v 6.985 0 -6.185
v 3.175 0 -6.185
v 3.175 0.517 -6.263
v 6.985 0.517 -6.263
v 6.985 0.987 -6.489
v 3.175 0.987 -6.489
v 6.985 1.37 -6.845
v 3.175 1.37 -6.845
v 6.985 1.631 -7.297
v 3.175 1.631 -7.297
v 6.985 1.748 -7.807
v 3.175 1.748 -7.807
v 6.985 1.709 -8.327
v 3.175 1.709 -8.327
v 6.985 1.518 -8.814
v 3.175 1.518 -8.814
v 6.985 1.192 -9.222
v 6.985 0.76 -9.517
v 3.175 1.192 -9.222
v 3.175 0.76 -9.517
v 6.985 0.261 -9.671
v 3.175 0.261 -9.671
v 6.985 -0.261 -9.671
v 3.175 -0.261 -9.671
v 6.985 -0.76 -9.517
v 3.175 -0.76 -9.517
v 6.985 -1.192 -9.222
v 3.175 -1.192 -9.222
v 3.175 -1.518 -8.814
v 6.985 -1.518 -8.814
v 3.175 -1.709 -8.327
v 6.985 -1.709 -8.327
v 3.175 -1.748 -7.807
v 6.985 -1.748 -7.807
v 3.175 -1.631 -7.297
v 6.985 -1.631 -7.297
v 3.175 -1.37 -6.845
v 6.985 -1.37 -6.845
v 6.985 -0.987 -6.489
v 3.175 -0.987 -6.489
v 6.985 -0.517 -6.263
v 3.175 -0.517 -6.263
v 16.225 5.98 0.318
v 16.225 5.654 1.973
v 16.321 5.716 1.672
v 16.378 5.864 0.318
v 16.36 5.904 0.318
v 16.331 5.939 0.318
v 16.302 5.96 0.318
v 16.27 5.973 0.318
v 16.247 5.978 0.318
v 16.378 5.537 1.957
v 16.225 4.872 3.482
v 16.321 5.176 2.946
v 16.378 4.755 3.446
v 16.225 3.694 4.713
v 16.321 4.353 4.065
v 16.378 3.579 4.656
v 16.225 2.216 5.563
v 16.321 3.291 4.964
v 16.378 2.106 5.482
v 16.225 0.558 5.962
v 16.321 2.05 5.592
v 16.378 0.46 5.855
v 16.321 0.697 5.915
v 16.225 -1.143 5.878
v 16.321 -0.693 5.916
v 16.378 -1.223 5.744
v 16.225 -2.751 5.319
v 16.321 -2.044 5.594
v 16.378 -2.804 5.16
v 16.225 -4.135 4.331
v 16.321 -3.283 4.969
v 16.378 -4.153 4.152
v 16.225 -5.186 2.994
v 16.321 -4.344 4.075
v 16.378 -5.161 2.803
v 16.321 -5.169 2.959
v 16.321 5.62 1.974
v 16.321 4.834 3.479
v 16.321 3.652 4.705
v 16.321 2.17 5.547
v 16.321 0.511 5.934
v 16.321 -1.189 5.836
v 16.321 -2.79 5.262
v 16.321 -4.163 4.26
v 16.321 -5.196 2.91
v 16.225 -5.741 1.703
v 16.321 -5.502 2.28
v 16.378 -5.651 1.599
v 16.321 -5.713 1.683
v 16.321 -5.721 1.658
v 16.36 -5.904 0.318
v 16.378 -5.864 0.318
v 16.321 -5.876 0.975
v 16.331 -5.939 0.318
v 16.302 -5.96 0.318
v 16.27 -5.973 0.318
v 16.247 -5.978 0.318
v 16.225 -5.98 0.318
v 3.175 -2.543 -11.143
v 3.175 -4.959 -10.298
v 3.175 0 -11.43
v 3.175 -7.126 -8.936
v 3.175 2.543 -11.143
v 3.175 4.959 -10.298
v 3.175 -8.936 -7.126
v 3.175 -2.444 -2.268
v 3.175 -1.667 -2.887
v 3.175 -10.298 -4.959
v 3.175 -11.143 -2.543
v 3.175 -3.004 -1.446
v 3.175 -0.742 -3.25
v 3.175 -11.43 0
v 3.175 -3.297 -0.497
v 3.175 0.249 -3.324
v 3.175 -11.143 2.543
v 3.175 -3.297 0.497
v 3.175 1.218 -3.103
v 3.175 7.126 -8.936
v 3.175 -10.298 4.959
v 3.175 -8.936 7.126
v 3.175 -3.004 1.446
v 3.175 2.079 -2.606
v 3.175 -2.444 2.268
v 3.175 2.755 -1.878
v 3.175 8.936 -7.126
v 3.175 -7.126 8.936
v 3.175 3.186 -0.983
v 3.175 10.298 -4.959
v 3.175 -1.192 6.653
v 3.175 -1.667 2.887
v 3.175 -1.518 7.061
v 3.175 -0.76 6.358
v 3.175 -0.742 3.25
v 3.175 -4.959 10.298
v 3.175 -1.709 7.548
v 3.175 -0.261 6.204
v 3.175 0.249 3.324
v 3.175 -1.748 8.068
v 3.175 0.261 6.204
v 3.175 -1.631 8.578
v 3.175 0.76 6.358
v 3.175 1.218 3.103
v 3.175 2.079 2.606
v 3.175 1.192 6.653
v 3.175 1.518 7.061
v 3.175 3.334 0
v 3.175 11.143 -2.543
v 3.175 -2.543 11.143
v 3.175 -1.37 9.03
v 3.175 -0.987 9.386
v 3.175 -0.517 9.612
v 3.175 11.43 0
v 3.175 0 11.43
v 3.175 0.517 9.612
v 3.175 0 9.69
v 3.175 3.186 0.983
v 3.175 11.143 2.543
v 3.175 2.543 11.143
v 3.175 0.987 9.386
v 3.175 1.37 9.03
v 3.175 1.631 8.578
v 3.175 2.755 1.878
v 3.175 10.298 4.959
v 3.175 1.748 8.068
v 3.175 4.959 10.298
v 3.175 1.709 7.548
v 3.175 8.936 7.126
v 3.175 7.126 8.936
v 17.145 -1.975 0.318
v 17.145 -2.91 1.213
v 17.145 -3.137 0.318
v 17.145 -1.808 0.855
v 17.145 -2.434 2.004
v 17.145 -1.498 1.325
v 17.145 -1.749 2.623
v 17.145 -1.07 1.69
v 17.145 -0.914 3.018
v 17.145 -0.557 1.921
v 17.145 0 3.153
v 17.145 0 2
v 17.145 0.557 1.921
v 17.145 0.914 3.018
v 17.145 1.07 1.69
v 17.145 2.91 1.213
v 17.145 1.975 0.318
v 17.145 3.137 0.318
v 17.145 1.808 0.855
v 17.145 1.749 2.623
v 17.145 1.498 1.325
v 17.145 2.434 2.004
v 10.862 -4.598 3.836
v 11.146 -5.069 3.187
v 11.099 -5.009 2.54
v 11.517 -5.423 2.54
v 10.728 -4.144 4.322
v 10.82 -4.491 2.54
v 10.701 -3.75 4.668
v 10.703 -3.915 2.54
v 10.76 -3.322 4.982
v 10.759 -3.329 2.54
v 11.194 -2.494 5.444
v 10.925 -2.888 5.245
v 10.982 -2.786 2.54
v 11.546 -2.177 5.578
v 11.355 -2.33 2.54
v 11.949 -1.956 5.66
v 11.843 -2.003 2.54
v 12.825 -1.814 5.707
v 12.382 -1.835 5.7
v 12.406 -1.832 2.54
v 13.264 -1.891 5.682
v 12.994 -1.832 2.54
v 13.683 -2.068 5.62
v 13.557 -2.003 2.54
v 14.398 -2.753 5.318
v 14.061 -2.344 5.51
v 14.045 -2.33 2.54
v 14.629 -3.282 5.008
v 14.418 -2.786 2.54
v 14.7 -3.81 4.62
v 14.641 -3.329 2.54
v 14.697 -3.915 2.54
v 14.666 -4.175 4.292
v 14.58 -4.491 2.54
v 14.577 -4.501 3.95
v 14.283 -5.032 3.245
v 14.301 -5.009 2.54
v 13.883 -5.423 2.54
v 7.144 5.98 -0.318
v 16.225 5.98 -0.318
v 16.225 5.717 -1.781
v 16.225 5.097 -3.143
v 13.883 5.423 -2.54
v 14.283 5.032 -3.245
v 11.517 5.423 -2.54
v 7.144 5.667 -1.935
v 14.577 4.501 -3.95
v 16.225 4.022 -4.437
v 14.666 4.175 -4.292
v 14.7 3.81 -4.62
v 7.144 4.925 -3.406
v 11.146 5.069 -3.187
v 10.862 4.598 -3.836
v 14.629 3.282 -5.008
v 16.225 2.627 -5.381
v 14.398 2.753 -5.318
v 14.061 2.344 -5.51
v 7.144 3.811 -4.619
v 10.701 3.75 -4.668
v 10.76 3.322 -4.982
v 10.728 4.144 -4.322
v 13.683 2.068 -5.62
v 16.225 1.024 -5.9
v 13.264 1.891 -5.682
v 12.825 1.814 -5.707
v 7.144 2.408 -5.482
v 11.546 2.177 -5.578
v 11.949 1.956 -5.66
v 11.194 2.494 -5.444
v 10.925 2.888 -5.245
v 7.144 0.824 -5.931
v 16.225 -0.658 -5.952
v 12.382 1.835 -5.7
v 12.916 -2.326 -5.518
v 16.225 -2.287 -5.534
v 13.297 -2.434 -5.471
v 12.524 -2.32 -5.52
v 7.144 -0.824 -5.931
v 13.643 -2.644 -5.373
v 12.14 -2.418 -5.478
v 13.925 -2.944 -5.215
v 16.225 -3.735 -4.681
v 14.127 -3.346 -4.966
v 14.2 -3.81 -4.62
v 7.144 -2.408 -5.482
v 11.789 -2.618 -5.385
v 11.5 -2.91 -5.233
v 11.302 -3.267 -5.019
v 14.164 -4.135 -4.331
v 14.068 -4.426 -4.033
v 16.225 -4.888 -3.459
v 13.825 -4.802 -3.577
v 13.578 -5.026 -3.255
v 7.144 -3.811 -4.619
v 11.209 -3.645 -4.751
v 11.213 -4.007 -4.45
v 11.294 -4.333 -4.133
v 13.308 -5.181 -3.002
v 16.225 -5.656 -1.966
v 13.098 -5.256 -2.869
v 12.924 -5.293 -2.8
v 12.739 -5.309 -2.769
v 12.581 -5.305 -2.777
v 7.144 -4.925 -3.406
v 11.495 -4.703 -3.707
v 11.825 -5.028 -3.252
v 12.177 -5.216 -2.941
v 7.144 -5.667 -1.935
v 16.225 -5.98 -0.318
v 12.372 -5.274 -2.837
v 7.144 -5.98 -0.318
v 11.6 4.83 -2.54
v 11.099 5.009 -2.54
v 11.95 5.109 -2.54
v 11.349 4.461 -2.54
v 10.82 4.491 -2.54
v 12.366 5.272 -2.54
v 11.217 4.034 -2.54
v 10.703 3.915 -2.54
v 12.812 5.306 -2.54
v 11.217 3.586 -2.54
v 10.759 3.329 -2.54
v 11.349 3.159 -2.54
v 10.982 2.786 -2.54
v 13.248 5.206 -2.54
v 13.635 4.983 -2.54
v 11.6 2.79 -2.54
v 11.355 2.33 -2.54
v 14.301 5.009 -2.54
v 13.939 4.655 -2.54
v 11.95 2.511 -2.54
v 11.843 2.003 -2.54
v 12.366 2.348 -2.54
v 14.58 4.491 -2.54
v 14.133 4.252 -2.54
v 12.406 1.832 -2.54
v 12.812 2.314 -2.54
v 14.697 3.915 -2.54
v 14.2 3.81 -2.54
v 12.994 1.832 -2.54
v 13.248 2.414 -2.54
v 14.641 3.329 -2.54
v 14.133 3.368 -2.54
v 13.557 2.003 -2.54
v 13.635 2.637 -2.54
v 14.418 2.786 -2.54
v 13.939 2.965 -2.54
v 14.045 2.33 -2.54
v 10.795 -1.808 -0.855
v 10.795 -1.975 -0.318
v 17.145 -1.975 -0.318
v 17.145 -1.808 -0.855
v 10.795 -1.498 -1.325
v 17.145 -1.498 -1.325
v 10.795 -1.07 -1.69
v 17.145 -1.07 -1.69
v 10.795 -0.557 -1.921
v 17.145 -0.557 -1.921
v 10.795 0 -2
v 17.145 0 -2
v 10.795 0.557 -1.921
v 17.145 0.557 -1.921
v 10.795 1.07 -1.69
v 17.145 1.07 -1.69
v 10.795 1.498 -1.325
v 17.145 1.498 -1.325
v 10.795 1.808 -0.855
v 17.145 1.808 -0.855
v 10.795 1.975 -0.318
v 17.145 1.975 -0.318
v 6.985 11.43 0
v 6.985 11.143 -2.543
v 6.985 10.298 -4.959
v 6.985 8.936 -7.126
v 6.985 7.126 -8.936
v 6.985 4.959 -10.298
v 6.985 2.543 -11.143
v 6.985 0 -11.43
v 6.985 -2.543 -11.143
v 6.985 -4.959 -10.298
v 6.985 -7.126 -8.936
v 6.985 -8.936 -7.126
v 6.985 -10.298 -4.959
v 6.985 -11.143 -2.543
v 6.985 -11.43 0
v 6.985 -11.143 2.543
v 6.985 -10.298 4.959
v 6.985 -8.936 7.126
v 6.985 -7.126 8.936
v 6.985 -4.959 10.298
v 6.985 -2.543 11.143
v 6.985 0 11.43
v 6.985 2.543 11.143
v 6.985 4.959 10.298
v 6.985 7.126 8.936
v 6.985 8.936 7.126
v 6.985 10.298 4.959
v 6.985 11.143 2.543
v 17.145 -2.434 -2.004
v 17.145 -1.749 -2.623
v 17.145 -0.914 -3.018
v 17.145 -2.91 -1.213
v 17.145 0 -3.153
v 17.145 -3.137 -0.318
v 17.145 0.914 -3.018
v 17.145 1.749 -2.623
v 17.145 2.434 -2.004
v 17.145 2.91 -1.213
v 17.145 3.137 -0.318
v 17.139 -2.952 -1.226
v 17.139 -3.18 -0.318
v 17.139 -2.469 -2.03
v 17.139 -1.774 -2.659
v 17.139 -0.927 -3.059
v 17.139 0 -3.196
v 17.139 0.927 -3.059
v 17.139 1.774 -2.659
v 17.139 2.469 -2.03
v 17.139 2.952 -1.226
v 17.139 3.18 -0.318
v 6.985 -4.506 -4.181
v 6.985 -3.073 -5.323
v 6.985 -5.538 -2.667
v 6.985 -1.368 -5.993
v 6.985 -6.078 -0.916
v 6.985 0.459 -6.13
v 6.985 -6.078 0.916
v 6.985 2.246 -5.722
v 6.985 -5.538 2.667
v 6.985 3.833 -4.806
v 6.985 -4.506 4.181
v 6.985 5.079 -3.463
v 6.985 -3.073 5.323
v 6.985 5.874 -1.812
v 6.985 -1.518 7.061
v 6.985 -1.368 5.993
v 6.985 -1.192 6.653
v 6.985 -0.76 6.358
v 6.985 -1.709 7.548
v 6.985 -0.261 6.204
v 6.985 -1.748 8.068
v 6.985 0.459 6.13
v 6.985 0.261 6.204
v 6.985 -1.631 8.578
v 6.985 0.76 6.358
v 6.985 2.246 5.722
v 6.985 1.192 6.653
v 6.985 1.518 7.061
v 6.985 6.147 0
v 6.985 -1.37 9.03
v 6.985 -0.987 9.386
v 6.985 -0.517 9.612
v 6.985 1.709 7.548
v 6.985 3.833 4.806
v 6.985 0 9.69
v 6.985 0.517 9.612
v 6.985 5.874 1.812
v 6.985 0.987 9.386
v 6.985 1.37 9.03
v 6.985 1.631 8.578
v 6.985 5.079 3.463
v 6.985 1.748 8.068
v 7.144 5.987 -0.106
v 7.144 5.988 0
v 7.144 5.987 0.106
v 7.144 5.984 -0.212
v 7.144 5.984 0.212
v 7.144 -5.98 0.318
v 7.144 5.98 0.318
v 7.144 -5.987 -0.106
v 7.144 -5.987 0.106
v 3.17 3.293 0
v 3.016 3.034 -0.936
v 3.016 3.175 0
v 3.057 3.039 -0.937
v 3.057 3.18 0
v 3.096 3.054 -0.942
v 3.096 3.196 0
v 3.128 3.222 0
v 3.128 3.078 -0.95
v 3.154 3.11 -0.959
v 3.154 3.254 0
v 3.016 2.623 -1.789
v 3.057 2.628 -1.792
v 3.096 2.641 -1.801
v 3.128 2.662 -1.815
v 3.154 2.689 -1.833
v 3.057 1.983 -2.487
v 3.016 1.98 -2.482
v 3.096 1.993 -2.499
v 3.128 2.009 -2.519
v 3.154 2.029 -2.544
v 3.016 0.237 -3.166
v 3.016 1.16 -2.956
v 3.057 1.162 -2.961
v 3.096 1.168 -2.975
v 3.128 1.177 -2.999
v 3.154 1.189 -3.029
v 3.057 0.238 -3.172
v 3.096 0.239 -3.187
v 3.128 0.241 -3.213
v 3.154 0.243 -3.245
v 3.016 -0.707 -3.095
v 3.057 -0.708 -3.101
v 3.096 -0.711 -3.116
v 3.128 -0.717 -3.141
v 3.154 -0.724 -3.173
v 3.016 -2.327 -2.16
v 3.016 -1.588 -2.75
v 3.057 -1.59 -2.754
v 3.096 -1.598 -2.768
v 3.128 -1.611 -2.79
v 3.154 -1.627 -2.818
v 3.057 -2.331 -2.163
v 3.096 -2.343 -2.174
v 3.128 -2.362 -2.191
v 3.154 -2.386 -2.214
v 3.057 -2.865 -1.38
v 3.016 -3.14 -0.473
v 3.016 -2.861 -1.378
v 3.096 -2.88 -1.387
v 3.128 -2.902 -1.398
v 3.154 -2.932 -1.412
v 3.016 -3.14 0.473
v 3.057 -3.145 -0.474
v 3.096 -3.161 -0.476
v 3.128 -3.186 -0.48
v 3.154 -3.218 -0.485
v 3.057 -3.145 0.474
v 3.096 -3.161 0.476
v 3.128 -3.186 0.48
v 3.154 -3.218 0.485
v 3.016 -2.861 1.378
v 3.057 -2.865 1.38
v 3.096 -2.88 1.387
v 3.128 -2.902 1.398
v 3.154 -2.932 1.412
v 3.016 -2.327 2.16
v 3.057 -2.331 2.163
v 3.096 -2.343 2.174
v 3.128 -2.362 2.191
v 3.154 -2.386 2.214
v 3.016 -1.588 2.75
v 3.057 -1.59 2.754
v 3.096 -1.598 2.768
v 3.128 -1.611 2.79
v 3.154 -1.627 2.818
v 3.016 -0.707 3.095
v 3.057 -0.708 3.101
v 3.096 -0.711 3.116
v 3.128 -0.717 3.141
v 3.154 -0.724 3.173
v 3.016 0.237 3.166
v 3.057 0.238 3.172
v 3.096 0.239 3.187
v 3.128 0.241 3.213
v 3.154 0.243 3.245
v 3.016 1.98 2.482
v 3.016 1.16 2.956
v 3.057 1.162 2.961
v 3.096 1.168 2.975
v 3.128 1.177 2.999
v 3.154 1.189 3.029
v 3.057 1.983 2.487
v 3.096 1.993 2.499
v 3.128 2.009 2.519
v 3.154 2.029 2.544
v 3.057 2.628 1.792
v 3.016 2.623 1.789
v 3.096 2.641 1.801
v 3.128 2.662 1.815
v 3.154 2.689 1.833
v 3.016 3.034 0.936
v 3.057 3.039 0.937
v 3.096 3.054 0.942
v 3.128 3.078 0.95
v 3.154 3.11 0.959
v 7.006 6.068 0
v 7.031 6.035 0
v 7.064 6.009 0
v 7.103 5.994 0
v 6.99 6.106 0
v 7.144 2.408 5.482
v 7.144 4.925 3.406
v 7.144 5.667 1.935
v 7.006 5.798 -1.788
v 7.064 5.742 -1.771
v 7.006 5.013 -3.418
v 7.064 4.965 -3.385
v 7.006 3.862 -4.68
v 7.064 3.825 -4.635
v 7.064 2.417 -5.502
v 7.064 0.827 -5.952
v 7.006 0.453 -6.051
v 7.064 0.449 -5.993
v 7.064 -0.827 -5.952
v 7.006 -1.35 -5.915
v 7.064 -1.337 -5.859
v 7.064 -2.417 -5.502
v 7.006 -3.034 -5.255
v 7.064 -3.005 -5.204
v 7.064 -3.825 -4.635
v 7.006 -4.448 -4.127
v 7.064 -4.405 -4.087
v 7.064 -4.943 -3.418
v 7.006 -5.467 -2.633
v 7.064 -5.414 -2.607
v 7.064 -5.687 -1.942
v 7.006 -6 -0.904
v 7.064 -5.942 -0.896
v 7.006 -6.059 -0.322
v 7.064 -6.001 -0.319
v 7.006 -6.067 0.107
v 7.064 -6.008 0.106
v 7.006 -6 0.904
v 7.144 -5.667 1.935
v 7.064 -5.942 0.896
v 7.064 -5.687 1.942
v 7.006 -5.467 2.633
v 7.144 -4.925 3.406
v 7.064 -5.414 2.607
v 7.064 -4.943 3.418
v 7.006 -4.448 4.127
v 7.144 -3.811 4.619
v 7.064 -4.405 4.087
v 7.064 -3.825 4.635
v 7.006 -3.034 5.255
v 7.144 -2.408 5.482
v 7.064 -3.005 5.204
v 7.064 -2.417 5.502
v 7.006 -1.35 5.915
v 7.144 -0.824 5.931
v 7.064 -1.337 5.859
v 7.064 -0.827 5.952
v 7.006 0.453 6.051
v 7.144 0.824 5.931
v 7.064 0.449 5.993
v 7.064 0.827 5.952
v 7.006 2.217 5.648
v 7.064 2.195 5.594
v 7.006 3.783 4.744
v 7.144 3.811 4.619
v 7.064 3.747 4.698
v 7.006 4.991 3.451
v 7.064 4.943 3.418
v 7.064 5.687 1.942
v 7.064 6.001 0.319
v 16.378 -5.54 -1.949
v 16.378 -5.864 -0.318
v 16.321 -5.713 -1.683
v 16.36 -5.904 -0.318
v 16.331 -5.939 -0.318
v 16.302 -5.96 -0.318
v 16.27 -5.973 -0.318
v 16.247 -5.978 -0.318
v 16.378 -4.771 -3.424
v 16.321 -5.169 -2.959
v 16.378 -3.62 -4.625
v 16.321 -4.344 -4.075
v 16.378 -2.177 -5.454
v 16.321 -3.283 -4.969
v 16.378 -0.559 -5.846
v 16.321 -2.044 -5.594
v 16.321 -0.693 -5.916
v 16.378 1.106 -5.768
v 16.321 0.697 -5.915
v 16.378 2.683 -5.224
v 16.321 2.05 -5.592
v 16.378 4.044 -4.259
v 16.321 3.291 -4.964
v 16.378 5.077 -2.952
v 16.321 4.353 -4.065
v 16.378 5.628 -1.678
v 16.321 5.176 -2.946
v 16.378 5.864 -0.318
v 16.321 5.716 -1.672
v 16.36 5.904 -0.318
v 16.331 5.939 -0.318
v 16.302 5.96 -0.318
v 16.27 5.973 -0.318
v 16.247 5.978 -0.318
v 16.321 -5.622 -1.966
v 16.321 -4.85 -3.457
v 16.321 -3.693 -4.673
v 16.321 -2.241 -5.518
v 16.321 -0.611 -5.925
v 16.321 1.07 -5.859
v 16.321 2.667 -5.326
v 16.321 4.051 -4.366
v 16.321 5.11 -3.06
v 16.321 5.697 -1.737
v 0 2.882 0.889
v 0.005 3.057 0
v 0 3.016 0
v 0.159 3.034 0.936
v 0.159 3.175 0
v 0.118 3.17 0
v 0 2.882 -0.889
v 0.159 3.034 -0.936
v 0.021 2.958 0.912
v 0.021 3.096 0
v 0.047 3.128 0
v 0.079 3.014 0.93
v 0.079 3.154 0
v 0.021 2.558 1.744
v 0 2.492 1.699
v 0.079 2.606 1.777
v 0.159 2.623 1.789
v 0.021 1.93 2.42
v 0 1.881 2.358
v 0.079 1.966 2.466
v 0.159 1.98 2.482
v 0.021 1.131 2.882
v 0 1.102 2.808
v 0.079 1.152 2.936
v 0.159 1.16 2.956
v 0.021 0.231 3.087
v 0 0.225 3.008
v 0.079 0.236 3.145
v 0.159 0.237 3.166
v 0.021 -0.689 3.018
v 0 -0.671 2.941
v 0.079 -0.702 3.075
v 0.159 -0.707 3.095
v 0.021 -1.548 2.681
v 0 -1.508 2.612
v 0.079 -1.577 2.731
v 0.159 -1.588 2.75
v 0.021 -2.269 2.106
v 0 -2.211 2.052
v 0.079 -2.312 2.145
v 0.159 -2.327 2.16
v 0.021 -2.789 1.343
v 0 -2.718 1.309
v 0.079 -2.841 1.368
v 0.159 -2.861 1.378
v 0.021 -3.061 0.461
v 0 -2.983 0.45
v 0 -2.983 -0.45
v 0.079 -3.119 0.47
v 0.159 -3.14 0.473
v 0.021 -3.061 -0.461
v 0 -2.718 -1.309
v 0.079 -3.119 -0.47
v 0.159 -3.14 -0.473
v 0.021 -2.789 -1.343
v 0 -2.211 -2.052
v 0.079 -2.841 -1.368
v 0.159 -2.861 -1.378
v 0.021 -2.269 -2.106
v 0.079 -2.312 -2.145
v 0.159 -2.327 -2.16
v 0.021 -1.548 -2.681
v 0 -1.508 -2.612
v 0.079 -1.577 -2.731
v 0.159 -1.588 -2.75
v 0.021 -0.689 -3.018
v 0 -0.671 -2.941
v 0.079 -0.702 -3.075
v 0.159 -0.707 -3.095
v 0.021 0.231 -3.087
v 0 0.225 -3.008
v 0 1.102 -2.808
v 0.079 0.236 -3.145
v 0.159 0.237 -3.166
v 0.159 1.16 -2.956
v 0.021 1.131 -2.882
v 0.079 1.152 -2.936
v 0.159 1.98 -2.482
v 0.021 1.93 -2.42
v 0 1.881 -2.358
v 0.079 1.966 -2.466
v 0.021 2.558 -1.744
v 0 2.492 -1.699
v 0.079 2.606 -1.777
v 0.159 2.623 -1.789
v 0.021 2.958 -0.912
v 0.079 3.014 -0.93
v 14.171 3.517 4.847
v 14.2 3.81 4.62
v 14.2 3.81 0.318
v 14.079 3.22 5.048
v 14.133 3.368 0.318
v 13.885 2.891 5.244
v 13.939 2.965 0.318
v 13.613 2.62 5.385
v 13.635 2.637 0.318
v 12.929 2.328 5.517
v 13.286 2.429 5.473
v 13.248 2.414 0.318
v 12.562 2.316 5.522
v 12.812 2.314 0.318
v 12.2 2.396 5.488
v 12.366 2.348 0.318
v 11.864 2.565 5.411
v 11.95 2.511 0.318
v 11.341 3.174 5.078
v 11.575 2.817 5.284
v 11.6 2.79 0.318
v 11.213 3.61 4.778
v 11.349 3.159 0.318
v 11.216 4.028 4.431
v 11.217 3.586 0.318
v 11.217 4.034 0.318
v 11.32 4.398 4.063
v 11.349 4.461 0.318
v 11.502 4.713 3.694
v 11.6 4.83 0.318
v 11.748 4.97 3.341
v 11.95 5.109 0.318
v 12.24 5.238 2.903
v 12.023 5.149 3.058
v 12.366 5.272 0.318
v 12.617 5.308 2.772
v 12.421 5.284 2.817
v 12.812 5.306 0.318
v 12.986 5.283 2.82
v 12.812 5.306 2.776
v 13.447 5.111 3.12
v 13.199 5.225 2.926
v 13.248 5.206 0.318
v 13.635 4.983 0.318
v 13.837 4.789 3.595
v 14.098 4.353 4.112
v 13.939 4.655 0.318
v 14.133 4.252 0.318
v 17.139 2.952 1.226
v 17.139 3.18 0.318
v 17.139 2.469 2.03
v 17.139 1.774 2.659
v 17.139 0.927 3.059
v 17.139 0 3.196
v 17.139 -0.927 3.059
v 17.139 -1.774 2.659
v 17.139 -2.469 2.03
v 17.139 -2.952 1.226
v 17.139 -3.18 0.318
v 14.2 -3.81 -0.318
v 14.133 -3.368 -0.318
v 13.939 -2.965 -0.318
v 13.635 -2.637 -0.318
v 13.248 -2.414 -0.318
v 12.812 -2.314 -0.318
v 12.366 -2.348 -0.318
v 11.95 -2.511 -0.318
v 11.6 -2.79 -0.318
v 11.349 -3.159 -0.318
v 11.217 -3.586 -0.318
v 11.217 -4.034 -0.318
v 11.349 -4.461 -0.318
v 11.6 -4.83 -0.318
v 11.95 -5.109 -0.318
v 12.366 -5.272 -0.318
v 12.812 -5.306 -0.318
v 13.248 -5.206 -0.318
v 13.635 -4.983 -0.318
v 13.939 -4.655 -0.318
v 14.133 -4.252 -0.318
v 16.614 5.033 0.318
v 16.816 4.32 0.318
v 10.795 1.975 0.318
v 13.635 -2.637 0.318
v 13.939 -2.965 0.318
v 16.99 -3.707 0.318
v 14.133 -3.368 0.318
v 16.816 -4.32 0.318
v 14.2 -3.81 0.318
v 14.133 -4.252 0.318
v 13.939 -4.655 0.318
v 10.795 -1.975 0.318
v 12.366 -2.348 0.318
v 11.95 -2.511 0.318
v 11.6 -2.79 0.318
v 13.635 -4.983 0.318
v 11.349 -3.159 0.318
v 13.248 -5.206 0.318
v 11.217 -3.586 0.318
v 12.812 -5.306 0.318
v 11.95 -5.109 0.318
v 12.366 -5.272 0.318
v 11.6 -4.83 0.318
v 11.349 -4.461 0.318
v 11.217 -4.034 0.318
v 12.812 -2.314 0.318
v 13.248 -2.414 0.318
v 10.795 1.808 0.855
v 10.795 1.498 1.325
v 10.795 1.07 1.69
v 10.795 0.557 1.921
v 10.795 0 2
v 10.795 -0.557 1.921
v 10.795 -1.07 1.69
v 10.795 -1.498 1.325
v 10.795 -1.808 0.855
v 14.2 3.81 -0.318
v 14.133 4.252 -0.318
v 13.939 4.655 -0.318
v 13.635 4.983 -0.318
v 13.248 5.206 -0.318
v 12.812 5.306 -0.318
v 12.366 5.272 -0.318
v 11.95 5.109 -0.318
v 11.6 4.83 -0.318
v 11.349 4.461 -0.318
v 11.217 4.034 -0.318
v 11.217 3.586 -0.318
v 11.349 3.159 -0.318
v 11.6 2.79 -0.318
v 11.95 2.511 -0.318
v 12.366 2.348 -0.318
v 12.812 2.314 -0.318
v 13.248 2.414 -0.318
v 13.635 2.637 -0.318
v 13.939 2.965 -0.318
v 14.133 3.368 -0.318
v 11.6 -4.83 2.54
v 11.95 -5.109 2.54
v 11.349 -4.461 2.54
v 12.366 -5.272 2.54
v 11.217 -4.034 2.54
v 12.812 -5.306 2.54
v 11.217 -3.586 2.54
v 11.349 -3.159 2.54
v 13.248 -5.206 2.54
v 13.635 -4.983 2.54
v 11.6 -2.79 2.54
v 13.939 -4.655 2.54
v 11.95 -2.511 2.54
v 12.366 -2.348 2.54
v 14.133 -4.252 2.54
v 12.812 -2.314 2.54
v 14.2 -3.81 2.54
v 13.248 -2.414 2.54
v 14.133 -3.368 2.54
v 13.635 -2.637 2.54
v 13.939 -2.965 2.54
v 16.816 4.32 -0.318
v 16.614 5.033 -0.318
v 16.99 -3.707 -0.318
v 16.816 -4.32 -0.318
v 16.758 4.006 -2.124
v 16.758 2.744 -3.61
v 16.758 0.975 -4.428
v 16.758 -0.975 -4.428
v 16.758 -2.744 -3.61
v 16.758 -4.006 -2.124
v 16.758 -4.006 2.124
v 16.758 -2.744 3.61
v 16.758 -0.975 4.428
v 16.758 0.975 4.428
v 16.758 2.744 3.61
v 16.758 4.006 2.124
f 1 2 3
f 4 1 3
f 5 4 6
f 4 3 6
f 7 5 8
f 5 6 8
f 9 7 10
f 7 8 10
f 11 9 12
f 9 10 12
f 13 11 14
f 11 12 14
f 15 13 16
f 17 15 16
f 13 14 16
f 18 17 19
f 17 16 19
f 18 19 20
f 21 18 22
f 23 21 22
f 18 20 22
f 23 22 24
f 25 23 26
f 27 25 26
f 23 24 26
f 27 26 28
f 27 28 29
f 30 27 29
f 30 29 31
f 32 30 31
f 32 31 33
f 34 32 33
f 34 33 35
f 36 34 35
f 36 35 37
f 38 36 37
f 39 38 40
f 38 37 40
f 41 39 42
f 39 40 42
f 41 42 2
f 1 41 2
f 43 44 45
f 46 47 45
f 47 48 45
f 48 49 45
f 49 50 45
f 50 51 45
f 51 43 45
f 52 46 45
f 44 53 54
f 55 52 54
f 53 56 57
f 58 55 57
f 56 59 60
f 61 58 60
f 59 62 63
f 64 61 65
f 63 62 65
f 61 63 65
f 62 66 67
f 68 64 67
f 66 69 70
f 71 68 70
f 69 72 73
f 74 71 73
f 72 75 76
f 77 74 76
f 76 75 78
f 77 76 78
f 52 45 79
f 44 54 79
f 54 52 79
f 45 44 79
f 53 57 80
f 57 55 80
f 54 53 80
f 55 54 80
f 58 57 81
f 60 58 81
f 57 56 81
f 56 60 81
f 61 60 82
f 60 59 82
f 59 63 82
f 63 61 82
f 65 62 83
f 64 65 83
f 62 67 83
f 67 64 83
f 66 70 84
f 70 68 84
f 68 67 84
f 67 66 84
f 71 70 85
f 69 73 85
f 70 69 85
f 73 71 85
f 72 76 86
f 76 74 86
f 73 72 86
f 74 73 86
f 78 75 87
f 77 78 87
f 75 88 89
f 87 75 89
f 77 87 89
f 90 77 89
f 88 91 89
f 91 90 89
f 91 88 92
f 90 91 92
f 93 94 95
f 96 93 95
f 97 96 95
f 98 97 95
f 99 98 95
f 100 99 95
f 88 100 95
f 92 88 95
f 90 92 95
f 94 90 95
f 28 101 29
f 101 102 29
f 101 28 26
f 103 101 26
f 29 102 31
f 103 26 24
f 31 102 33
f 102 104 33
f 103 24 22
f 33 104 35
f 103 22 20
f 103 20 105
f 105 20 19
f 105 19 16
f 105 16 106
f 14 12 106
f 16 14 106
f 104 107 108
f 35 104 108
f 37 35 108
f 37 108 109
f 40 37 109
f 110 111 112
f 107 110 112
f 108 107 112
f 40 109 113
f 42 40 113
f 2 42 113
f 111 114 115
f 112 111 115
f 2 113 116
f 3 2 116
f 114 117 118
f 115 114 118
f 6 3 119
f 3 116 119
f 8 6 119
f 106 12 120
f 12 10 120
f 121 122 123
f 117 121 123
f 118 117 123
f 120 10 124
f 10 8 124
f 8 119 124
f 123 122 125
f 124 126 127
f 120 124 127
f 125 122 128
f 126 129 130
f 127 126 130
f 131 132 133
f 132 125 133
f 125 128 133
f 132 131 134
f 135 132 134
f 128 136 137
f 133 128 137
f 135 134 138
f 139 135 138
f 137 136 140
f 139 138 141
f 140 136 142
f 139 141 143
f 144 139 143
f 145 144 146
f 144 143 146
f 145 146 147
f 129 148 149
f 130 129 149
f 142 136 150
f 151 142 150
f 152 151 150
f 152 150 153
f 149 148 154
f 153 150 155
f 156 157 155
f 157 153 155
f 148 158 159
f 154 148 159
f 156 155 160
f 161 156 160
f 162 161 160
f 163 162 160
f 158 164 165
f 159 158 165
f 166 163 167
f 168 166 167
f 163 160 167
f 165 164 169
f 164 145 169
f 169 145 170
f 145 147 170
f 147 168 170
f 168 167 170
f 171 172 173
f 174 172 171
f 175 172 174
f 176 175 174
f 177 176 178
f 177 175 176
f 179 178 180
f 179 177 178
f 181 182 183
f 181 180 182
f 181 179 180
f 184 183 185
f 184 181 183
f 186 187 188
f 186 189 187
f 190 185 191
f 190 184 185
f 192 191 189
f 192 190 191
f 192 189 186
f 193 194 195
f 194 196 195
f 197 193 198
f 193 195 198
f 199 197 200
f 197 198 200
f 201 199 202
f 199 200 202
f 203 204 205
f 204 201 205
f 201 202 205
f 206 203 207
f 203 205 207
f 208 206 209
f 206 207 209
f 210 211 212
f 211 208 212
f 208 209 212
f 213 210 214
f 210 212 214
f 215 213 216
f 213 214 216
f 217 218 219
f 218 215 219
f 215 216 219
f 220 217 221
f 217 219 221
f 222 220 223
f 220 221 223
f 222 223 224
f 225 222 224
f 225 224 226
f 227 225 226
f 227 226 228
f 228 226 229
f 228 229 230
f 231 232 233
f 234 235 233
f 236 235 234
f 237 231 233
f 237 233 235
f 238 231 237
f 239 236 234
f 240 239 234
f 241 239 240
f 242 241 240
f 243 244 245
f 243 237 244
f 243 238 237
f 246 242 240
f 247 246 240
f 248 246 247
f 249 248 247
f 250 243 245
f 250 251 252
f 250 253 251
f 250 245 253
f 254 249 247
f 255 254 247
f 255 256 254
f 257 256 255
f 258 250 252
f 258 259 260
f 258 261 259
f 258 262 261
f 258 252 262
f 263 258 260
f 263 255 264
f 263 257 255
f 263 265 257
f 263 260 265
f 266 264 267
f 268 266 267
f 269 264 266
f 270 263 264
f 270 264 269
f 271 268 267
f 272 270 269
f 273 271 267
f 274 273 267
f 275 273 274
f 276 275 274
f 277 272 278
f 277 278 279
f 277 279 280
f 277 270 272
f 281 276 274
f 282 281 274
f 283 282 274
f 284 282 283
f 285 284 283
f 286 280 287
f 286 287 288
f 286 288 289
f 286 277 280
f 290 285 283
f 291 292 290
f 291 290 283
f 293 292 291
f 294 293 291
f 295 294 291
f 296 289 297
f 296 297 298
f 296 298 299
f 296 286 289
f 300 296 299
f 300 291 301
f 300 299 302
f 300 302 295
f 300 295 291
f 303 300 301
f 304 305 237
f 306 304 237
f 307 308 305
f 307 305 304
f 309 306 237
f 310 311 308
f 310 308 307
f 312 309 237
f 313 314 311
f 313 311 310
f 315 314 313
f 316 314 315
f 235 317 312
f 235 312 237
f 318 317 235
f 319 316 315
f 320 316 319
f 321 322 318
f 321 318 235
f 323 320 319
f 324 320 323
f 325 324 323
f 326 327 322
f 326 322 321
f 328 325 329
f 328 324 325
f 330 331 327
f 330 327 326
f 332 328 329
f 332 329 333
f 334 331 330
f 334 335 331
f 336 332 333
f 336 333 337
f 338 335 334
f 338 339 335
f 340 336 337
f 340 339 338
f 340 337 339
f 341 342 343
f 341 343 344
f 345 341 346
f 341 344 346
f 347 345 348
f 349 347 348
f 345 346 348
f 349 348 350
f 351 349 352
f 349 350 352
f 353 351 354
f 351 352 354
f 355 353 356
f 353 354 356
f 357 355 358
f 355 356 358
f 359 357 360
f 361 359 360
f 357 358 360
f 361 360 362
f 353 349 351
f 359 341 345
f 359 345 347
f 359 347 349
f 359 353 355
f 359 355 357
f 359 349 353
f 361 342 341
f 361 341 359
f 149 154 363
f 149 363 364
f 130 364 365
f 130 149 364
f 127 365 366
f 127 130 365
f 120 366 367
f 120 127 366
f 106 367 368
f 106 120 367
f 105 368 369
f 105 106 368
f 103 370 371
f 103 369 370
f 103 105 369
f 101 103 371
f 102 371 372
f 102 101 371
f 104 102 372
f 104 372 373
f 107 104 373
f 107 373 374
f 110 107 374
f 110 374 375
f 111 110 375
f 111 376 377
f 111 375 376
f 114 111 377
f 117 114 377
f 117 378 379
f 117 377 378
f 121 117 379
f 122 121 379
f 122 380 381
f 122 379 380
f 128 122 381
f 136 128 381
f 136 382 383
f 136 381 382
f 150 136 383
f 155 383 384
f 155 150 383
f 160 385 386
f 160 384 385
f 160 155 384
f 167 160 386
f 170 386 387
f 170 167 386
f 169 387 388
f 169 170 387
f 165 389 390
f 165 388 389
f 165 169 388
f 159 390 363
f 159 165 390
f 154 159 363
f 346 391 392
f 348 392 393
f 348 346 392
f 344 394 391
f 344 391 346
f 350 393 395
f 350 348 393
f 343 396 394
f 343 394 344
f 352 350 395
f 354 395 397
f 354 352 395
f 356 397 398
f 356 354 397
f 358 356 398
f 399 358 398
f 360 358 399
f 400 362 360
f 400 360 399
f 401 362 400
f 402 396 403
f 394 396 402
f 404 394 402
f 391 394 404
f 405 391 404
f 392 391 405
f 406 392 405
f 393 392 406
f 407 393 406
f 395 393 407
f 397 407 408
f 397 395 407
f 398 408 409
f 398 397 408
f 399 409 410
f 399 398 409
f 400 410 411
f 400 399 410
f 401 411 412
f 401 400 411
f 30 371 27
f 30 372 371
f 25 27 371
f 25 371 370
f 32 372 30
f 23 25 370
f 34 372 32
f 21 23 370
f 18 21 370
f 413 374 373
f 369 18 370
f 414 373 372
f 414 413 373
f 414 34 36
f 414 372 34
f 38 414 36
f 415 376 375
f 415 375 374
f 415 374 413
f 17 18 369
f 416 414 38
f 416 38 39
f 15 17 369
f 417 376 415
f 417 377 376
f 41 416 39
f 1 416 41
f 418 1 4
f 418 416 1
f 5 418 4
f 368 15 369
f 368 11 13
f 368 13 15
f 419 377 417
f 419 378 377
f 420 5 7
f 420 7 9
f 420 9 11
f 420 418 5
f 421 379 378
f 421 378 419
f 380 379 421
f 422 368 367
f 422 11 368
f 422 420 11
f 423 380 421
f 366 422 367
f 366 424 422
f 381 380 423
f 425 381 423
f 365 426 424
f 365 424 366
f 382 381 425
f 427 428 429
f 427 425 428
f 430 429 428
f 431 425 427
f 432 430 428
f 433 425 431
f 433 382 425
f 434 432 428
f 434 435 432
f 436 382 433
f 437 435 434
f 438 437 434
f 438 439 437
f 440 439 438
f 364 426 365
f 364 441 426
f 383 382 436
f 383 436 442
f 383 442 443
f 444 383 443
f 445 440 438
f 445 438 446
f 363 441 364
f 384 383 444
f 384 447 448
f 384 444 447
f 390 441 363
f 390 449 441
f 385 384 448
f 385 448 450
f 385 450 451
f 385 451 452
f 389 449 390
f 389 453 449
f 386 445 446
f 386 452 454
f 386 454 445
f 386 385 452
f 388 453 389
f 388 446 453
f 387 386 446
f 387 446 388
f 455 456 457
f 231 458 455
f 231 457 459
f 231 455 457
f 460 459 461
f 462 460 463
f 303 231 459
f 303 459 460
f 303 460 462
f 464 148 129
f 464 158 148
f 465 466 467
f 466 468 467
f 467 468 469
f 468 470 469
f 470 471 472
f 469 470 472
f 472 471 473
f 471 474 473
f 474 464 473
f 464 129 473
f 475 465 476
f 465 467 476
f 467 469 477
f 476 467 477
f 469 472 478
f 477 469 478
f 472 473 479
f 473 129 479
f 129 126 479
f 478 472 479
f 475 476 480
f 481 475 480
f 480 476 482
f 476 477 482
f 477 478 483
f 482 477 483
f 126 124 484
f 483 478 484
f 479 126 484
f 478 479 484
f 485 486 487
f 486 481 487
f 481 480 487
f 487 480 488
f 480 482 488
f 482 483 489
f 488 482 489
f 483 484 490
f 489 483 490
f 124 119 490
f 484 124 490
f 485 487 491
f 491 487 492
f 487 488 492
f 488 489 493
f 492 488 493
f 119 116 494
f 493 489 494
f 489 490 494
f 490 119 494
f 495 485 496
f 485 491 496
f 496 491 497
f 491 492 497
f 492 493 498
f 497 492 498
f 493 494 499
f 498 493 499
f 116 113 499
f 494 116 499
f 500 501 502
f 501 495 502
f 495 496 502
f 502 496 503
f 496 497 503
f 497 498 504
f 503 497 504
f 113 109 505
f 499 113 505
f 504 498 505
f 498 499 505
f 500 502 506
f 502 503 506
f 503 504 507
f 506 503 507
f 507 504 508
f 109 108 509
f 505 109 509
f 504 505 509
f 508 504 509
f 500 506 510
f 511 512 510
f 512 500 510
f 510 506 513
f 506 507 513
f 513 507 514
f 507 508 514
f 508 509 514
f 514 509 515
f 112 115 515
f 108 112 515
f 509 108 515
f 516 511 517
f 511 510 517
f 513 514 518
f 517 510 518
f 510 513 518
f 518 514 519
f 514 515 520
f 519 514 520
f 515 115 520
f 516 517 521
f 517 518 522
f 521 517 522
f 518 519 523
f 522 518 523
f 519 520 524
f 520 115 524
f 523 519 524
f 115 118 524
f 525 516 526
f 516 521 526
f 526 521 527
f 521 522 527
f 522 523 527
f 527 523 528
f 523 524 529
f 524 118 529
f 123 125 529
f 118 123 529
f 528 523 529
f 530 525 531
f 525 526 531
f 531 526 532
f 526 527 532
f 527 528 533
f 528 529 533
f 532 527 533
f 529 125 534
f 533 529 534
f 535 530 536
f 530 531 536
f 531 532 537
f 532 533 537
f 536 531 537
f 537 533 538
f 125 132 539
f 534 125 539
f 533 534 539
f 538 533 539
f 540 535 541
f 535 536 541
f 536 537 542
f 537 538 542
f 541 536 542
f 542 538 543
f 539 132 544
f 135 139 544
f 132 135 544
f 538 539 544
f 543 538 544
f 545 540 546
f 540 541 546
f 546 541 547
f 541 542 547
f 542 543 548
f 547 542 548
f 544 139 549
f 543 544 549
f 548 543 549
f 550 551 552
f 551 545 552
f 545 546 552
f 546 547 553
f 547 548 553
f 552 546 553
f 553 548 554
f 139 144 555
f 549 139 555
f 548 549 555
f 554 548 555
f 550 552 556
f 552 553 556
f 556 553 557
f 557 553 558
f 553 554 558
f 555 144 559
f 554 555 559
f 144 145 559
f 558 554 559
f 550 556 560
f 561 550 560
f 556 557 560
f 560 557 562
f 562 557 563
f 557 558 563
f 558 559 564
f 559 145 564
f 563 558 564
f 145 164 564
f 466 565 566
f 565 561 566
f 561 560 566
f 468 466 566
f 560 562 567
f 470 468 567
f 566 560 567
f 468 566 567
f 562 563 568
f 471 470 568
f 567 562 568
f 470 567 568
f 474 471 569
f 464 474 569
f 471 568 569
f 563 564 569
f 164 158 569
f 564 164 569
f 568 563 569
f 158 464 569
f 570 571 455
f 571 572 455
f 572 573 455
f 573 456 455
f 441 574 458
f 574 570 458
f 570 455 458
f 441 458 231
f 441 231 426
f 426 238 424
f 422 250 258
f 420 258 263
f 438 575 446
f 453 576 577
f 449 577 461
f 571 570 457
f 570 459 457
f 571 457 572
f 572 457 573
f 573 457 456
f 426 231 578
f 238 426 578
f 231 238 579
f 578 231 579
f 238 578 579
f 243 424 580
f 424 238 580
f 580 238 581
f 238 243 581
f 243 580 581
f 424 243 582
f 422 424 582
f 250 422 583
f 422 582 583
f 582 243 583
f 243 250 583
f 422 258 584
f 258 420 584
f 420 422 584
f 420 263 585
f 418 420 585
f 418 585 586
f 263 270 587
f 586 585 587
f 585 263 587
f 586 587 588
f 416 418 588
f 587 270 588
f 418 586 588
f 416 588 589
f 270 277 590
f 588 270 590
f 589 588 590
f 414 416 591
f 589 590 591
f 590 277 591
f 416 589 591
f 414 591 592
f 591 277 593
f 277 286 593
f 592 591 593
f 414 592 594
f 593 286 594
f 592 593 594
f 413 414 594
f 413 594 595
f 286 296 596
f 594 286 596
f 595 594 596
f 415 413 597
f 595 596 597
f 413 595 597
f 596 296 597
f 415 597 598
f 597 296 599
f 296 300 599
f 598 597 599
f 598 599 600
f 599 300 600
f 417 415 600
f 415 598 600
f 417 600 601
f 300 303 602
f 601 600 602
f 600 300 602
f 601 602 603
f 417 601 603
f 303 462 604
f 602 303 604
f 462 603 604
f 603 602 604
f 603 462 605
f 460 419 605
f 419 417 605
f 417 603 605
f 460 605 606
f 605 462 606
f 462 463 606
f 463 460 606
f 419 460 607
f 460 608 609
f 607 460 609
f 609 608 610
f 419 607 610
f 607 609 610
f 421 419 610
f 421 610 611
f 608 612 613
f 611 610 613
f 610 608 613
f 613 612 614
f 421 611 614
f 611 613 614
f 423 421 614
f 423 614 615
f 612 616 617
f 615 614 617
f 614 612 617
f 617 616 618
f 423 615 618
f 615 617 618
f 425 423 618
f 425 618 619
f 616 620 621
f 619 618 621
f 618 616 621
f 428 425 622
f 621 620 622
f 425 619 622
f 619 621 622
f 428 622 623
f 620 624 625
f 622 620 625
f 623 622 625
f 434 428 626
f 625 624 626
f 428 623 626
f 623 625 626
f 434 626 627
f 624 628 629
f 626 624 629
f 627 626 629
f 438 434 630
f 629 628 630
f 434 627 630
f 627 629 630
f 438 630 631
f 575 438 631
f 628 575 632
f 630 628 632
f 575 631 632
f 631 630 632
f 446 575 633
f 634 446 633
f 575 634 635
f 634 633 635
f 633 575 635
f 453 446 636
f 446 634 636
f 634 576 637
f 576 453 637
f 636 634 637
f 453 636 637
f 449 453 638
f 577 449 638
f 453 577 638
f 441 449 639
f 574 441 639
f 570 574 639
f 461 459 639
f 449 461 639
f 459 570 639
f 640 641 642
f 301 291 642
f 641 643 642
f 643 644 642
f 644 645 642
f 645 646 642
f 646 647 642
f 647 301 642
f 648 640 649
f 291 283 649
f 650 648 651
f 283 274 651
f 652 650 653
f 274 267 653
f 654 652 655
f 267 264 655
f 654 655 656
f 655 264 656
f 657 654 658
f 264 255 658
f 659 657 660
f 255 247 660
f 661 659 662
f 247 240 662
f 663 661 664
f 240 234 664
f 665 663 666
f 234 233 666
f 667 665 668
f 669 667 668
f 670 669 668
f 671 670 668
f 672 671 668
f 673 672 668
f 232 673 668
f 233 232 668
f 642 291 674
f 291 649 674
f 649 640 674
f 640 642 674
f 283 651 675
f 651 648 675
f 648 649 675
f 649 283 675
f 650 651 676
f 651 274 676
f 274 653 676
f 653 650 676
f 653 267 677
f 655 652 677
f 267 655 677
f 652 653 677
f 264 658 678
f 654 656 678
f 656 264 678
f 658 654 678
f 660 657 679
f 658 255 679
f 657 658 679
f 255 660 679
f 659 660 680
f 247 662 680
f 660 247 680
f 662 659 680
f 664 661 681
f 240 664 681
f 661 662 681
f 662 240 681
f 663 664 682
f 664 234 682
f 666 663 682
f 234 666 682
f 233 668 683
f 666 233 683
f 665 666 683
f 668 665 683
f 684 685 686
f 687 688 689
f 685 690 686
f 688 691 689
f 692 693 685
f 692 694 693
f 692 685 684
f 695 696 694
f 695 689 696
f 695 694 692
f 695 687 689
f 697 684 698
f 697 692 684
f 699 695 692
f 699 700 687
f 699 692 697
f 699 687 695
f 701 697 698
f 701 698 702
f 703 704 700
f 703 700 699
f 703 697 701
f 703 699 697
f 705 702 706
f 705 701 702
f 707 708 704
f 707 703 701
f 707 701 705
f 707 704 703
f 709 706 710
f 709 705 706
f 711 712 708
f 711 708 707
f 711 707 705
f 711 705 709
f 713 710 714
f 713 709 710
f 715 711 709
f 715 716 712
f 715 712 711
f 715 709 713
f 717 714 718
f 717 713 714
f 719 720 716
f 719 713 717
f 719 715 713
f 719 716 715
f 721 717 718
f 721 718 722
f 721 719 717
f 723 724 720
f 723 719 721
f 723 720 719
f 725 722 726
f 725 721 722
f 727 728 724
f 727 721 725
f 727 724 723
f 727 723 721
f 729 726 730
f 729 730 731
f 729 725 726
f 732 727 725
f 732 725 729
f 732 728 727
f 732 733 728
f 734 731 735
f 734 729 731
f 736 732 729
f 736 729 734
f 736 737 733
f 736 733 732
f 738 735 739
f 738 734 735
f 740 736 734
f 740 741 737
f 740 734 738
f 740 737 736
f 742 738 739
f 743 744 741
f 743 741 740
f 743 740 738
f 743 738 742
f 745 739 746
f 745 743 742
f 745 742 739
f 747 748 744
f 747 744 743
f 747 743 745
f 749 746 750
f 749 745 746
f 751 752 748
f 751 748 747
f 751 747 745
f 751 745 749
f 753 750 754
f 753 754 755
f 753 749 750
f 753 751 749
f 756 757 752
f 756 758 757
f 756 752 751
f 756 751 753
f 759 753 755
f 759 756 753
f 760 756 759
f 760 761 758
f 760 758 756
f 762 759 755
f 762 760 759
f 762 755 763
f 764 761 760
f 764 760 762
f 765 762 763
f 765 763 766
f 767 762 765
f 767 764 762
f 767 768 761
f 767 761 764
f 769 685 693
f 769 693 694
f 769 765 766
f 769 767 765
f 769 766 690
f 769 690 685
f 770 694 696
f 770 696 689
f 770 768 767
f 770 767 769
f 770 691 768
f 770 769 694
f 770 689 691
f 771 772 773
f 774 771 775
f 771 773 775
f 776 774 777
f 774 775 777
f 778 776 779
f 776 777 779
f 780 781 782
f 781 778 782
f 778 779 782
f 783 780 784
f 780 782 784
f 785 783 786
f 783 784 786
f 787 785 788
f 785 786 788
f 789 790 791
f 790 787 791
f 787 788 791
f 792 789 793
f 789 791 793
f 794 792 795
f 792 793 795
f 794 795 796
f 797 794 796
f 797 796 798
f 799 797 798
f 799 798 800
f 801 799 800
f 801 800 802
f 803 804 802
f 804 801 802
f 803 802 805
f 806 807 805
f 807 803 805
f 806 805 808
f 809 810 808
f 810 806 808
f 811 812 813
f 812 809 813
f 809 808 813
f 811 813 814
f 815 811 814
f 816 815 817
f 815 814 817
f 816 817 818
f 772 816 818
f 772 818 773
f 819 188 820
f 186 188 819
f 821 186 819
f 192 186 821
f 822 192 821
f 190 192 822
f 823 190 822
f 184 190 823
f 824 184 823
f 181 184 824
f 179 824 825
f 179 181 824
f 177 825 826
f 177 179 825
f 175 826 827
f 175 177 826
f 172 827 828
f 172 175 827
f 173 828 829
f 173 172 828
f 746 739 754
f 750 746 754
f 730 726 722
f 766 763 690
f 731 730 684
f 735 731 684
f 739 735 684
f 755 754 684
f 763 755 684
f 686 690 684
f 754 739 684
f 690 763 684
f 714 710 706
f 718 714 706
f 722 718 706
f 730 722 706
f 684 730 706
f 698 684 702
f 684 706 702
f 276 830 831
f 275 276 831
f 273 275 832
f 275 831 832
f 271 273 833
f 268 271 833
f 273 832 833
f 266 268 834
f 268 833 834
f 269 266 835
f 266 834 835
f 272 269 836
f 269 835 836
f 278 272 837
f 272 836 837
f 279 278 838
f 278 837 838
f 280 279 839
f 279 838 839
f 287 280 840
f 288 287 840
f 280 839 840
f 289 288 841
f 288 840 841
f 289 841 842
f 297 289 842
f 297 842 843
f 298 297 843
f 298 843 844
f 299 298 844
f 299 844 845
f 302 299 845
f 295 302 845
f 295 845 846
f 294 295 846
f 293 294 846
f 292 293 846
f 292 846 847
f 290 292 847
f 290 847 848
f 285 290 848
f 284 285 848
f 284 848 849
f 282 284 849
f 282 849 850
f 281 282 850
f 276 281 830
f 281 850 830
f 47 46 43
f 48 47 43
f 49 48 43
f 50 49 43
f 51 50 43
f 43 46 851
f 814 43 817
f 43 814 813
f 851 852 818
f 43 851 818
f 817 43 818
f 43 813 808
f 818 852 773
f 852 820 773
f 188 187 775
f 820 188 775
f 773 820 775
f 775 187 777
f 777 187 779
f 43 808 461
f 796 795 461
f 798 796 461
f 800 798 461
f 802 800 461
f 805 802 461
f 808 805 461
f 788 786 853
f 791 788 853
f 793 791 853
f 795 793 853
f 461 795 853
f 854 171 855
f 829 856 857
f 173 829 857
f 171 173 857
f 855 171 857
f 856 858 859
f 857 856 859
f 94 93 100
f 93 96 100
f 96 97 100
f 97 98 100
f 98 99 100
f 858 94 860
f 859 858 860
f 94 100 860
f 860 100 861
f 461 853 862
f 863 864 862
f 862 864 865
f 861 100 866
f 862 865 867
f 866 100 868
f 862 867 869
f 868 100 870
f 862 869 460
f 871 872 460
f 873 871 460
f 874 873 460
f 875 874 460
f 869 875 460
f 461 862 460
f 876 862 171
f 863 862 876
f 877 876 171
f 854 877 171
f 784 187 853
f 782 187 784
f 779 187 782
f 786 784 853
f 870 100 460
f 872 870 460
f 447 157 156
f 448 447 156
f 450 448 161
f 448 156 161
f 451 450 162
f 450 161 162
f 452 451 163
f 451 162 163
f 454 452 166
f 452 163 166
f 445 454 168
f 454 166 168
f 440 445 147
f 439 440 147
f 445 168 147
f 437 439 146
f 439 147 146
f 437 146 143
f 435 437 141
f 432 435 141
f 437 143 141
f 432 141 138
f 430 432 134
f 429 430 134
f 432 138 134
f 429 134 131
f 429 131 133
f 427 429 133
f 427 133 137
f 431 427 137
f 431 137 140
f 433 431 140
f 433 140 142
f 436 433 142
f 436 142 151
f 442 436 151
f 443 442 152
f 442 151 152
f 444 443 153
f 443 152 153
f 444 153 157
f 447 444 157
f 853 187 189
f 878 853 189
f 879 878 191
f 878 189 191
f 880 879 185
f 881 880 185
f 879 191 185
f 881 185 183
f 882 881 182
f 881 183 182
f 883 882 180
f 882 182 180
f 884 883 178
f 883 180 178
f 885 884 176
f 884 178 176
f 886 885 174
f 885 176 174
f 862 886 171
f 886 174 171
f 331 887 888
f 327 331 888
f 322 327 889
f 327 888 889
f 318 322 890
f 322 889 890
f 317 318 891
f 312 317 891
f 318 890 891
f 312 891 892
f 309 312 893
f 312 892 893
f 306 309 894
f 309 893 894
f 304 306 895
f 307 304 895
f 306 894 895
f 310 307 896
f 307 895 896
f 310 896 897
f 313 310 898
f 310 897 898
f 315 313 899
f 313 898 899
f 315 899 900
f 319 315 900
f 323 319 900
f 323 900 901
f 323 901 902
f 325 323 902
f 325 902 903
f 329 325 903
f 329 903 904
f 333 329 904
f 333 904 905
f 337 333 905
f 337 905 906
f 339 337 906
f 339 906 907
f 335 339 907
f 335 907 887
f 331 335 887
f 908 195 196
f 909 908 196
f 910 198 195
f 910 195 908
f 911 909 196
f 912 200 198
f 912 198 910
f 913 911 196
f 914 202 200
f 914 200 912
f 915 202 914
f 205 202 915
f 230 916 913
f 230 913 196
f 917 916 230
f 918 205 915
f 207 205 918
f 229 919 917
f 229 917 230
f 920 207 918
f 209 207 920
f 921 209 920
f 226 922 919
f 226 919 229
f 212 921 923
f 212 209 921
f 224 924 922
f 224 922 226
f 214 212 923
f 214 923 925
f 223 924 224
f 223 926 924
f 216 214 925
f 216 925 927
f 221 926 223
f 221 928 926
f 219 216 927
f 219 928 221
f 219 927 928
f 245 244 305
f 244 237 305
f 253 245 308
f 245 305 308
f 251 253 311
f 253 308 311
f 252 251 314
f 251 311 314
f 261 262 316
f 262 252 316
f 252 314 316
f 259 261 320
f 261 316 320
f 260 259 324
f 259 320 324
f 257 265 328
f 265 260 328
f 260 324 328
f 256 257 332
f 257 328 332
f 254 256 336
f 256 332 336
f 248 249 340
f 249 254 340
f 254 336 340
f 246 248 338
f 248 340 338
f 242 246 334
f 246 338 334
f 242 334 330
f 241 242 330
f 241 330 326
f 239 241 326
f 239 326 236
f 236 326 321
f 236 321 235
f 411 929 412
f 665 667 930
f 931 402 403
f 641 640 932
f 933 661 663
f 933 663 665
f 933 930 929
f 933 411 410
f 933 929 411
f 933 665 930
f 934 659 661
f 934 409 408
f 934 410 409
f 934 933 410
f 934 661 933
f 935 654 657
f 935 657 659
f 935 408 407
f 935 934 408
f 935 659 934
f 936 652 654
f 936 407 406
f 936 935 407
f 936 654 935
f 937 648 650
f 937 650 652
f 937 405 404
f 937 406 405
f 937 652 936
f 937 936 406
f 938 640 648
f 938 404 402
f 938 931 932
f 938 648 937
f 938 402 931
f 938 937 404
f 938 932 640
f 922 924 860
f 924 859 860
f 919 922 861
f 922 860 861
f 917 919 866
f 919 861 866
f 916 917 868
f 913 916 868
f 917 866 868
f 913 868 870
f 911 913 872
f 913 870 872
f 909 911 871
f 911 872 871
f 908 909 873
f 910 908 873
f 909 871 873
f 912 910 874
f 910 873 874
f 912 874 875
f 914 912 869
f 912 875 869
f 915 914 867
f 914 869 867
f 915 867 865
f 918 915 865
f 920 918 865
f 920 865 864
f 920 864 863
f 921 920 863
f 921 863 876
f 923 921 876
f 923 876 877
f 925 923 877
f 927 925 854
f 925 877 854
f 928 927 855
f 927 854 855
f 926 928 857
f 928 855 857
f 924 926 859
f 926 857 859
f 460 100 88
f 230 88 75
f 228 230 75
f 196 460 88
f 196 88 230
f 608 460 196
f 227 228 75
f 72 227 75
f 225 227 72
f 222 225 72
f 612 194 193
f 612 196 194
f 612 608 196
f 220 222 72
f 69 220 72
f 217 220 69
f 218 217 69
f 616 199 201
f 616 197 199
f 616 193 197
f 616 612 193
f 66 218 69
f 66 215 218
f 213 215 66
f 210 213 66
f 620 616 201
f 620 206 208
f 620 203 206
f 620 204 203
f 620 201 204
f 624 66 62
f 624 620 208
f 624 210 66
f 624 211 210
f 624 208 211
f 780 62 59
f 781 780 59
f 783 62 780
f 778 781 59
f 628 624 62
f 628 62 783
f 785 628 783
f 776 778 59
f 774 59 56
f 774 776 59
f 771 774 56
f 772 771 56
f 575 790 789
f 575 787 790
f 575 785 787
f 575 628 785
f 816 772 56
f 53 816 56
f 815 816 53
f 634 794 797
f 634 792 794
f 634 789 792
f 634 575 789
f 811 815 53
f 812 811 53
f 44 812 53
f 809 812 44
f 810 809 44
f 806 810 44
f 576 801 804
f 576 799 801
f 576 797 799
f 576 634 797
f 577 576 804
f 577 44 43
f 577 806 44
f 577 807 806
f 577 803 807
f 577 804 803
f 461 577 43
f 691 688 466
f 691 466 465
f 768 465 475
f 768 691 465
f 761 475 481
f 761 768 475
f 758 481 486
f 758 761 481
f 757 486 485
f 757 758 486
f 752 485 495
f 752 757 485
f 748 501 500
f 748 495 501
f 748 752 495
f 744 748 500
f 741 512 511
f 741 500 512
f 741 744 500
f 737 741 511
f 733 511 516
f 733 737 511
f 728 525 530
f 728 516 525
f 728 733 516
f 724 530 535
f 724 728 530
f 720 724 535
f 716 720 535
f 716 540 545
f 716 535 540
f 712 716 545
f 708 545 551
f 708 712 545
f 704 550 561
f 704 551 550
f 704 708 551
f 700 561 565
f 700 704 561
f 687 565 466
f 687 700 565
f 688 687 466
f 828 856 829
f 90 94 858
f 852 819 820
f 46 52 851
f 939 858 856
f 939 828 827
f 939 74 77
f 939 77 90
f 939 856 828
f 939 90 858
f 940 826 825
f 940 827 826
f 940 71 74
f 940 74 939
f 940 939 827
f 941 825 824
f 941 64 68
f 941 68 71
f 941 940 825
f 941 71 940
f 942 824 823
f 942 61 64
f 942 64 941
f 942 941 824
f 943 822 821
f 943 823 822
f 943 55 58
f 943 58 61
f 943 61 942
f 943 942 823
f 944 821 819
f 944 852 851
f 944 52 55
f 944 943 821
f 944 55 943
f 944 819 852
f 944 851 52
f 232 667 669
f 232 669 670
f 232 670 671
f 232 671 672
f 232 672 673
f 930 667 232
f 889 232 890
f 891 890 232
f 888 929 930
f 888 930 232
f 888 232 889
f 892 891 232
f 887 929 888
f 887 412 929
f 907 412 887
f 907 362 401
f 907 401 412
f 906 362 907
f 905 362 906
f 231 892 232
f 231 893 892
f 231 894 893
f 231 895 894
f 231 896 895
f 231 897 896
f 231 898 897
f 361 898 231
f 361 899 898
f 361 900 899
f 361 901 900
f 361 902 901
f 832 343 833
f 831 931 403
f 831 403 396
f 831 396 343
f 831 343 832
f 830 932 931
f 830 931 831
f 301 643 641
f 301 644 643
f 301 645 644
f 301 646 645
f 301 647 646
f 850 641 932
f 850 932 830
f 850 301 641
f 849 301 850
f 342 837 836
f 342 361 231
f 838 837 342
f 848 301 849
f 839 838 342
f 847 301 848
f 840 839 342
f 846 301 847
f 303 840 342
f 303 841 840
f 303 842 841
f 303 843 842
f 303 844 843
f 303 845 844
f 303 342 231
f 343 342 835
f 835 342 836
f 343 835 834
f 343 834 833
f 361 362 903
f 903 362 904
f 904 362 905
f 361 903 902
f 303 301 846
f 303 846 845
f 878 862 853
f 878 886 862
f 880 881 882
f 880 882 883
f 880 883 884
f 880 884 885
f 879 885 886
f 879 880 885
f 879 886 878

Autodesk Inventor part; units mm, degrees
ref_plane "YZ Plane" through (0, 0, 0) normal (1, 0, 0) x (0, 1, 0)
ref_plane "XZ Plane" through (0, 0, 0) normal (0, 1, 0) x (-1, 0, 0)
sketch "Sketch1" plane through (0, 0, 0) normal (0, 0, 1) x (1, 0, 0)
  line L0 (0, 0) -> (17.145, 0)
  line L1 (0, 0) -> (3.175, 0)
  line L2 (3.175, 0) -> (3.175, 3.175)
  line L3 (3.175, 3.175) -> (0, 3.175)
  line L4 (0, 3.175) -> (0, 0)
  line L5 (3.175, 0) -> (6.985, 0)
  line L6 (6.985, 0) -> (6.985, 11.43)
  line L7 (6.985, 11.43) -> (3.175, 11.43)
  line L8 (3.175, 11.43) -> (3.175, 0)
  line L9 (6.985, 0) -> (17.145, 0)
  line L10 (17.145, 0) -> (17.145, 5.9881)
  line L11 (17.145, 5.9881) -> (6.985, 5.9881)
  line L12 (6.985, 5.9881) -> (6.985, 0)
  line L13 (17.145, 0) -> (10.795, 0)
  line L14 (10.795, 0) -> (10.795, 2)
  line L15 (10.795, 2) -> (17.145, 2)
  line L16 (17.145, 2) -> (17.145, 0)
  line L17 (16.3449, 5.9881) -> (17.145, 3.175)
  point P0 (6.985, 5.9881)
  dimension "d0" = 17.145
  dimension "d1" = 3.175
  dimension "d2" = 3.175
  dimension "d3" = 3.81
  dimension "d4" = 11.43
  dimension "d5" = 10.16
  dimension "d6" = 5.9881
  dimension "d7" = 6.35
  dimension "d8" = 2
  dimension "d10" = 3.175
  dimension "d11" = 9.3599
revolve "Revolution1" add sketch "Sketch1" angle 360 about axis through (0, 0, 0) along (1, 0, 0) contours L4 L3 L2 L0 | L2 L8 L7 L6 L0 | L6 L11 L17 L10 L15 L14 L0
fillet "Fillet1" radius 0.1588 5 edges at (6.985, -5.9881, 0) (16.3449, -5.9881, 0) (17.145, -3.175, 0) (3.175, -3.175, 0) (0, -3.175, 0)
sketch "Sketch2" plane through (0, 0, 0) normal (0, 0, 1) x (1, 0, 0)
  line L0 (6.985, -11.43) -> (6.985, 11.43) projected
  line L1 (6.985, 0) -> (12.7, 0) construction
  line L2 (12.7, 0) -> (12.7, 3.81) construction
  circle A0 centre (12.7, 3.81) radius 1.5
  circle A1 centre (12.7, -3.81) radius 1.5
  point P0 (0, 0)
  dimension "d13" = 5.715
  dimension "d14" = 3.81
  dimension "d15" = 3
extrude "Extrusion1" cut sketch "Sketch2" along normal through all both and the other way through all
sketch "Sketch3" plane through (0, 0, 0) normal (0, 0, 1) x (-1, 0, 0)
  line L0 (-7.1437, -5.9881) -> (-7.1437, 5.9881) projected
  line L1 (-7.1437, 5.9881) -> (-19.8438, 5.988)
  line L2 (-19.8438, 5.988) -> (-19.8437, -5.9881)
  line L3 (-19.8437, -5.9881) -> (-7.1437, -5.9881)
  line L4 (-7.1437, -5.9881) -> (-7.1437, 5.9881)
  point P0 (0, 0)
  dimension "d18" = 12.7
extrude "Extrusion2" cut sketch "Sketch3" along normal mid plane 0.635
ref_plane "Work Plane1" through (0, 0, 2.54) normal (0, 0, 1) x (1, 0, 0)
sketch "Sketch4" plane through (0, 0, 2.54) normal (0, 0, 1) x (1, 0, 0)
  circle A0 centre (12.7, -3.81) radius 2
  line L0 (6.985, -11.43) -> (6.985, 11.43) projected
  line L1 (16.225, -5.9796) -> (7.1437, -5.9796) projected
  point P0 (0, 0)
  point P1 (0, 0)
  dimension "d22" = 4
  dimension "d23" = 5.715
  dimension "d25" = 3.81
extrude "Extrusion3" cut sketch "Sketch4" along normal through all
pattern_circular "Circular Pattern1" count 2 over 360 about axis through (13.97, 0, 0) along (1, 0, 0) of "Extrusion3"
sketch "Sketch5" plane through (3.175, 0, 0) normal (-1, 0, 0) x (0, 0, 1)
  circle A0 centre (0, 0) radius 7.9375 construction
  circle A1 centre (7.9375, 0) radius 1.7526
  circle A2 centre (-7.9375, 0) radius 1.7526
  dimension "d31" = 15.875
  dimension "d32" = 3.5052
  dimension "d33" = 3.5052
extrude "Extrusion4" cut sketch "Sketch5" against normal through all
properties part number "Hub" material "Stainless Steel"
